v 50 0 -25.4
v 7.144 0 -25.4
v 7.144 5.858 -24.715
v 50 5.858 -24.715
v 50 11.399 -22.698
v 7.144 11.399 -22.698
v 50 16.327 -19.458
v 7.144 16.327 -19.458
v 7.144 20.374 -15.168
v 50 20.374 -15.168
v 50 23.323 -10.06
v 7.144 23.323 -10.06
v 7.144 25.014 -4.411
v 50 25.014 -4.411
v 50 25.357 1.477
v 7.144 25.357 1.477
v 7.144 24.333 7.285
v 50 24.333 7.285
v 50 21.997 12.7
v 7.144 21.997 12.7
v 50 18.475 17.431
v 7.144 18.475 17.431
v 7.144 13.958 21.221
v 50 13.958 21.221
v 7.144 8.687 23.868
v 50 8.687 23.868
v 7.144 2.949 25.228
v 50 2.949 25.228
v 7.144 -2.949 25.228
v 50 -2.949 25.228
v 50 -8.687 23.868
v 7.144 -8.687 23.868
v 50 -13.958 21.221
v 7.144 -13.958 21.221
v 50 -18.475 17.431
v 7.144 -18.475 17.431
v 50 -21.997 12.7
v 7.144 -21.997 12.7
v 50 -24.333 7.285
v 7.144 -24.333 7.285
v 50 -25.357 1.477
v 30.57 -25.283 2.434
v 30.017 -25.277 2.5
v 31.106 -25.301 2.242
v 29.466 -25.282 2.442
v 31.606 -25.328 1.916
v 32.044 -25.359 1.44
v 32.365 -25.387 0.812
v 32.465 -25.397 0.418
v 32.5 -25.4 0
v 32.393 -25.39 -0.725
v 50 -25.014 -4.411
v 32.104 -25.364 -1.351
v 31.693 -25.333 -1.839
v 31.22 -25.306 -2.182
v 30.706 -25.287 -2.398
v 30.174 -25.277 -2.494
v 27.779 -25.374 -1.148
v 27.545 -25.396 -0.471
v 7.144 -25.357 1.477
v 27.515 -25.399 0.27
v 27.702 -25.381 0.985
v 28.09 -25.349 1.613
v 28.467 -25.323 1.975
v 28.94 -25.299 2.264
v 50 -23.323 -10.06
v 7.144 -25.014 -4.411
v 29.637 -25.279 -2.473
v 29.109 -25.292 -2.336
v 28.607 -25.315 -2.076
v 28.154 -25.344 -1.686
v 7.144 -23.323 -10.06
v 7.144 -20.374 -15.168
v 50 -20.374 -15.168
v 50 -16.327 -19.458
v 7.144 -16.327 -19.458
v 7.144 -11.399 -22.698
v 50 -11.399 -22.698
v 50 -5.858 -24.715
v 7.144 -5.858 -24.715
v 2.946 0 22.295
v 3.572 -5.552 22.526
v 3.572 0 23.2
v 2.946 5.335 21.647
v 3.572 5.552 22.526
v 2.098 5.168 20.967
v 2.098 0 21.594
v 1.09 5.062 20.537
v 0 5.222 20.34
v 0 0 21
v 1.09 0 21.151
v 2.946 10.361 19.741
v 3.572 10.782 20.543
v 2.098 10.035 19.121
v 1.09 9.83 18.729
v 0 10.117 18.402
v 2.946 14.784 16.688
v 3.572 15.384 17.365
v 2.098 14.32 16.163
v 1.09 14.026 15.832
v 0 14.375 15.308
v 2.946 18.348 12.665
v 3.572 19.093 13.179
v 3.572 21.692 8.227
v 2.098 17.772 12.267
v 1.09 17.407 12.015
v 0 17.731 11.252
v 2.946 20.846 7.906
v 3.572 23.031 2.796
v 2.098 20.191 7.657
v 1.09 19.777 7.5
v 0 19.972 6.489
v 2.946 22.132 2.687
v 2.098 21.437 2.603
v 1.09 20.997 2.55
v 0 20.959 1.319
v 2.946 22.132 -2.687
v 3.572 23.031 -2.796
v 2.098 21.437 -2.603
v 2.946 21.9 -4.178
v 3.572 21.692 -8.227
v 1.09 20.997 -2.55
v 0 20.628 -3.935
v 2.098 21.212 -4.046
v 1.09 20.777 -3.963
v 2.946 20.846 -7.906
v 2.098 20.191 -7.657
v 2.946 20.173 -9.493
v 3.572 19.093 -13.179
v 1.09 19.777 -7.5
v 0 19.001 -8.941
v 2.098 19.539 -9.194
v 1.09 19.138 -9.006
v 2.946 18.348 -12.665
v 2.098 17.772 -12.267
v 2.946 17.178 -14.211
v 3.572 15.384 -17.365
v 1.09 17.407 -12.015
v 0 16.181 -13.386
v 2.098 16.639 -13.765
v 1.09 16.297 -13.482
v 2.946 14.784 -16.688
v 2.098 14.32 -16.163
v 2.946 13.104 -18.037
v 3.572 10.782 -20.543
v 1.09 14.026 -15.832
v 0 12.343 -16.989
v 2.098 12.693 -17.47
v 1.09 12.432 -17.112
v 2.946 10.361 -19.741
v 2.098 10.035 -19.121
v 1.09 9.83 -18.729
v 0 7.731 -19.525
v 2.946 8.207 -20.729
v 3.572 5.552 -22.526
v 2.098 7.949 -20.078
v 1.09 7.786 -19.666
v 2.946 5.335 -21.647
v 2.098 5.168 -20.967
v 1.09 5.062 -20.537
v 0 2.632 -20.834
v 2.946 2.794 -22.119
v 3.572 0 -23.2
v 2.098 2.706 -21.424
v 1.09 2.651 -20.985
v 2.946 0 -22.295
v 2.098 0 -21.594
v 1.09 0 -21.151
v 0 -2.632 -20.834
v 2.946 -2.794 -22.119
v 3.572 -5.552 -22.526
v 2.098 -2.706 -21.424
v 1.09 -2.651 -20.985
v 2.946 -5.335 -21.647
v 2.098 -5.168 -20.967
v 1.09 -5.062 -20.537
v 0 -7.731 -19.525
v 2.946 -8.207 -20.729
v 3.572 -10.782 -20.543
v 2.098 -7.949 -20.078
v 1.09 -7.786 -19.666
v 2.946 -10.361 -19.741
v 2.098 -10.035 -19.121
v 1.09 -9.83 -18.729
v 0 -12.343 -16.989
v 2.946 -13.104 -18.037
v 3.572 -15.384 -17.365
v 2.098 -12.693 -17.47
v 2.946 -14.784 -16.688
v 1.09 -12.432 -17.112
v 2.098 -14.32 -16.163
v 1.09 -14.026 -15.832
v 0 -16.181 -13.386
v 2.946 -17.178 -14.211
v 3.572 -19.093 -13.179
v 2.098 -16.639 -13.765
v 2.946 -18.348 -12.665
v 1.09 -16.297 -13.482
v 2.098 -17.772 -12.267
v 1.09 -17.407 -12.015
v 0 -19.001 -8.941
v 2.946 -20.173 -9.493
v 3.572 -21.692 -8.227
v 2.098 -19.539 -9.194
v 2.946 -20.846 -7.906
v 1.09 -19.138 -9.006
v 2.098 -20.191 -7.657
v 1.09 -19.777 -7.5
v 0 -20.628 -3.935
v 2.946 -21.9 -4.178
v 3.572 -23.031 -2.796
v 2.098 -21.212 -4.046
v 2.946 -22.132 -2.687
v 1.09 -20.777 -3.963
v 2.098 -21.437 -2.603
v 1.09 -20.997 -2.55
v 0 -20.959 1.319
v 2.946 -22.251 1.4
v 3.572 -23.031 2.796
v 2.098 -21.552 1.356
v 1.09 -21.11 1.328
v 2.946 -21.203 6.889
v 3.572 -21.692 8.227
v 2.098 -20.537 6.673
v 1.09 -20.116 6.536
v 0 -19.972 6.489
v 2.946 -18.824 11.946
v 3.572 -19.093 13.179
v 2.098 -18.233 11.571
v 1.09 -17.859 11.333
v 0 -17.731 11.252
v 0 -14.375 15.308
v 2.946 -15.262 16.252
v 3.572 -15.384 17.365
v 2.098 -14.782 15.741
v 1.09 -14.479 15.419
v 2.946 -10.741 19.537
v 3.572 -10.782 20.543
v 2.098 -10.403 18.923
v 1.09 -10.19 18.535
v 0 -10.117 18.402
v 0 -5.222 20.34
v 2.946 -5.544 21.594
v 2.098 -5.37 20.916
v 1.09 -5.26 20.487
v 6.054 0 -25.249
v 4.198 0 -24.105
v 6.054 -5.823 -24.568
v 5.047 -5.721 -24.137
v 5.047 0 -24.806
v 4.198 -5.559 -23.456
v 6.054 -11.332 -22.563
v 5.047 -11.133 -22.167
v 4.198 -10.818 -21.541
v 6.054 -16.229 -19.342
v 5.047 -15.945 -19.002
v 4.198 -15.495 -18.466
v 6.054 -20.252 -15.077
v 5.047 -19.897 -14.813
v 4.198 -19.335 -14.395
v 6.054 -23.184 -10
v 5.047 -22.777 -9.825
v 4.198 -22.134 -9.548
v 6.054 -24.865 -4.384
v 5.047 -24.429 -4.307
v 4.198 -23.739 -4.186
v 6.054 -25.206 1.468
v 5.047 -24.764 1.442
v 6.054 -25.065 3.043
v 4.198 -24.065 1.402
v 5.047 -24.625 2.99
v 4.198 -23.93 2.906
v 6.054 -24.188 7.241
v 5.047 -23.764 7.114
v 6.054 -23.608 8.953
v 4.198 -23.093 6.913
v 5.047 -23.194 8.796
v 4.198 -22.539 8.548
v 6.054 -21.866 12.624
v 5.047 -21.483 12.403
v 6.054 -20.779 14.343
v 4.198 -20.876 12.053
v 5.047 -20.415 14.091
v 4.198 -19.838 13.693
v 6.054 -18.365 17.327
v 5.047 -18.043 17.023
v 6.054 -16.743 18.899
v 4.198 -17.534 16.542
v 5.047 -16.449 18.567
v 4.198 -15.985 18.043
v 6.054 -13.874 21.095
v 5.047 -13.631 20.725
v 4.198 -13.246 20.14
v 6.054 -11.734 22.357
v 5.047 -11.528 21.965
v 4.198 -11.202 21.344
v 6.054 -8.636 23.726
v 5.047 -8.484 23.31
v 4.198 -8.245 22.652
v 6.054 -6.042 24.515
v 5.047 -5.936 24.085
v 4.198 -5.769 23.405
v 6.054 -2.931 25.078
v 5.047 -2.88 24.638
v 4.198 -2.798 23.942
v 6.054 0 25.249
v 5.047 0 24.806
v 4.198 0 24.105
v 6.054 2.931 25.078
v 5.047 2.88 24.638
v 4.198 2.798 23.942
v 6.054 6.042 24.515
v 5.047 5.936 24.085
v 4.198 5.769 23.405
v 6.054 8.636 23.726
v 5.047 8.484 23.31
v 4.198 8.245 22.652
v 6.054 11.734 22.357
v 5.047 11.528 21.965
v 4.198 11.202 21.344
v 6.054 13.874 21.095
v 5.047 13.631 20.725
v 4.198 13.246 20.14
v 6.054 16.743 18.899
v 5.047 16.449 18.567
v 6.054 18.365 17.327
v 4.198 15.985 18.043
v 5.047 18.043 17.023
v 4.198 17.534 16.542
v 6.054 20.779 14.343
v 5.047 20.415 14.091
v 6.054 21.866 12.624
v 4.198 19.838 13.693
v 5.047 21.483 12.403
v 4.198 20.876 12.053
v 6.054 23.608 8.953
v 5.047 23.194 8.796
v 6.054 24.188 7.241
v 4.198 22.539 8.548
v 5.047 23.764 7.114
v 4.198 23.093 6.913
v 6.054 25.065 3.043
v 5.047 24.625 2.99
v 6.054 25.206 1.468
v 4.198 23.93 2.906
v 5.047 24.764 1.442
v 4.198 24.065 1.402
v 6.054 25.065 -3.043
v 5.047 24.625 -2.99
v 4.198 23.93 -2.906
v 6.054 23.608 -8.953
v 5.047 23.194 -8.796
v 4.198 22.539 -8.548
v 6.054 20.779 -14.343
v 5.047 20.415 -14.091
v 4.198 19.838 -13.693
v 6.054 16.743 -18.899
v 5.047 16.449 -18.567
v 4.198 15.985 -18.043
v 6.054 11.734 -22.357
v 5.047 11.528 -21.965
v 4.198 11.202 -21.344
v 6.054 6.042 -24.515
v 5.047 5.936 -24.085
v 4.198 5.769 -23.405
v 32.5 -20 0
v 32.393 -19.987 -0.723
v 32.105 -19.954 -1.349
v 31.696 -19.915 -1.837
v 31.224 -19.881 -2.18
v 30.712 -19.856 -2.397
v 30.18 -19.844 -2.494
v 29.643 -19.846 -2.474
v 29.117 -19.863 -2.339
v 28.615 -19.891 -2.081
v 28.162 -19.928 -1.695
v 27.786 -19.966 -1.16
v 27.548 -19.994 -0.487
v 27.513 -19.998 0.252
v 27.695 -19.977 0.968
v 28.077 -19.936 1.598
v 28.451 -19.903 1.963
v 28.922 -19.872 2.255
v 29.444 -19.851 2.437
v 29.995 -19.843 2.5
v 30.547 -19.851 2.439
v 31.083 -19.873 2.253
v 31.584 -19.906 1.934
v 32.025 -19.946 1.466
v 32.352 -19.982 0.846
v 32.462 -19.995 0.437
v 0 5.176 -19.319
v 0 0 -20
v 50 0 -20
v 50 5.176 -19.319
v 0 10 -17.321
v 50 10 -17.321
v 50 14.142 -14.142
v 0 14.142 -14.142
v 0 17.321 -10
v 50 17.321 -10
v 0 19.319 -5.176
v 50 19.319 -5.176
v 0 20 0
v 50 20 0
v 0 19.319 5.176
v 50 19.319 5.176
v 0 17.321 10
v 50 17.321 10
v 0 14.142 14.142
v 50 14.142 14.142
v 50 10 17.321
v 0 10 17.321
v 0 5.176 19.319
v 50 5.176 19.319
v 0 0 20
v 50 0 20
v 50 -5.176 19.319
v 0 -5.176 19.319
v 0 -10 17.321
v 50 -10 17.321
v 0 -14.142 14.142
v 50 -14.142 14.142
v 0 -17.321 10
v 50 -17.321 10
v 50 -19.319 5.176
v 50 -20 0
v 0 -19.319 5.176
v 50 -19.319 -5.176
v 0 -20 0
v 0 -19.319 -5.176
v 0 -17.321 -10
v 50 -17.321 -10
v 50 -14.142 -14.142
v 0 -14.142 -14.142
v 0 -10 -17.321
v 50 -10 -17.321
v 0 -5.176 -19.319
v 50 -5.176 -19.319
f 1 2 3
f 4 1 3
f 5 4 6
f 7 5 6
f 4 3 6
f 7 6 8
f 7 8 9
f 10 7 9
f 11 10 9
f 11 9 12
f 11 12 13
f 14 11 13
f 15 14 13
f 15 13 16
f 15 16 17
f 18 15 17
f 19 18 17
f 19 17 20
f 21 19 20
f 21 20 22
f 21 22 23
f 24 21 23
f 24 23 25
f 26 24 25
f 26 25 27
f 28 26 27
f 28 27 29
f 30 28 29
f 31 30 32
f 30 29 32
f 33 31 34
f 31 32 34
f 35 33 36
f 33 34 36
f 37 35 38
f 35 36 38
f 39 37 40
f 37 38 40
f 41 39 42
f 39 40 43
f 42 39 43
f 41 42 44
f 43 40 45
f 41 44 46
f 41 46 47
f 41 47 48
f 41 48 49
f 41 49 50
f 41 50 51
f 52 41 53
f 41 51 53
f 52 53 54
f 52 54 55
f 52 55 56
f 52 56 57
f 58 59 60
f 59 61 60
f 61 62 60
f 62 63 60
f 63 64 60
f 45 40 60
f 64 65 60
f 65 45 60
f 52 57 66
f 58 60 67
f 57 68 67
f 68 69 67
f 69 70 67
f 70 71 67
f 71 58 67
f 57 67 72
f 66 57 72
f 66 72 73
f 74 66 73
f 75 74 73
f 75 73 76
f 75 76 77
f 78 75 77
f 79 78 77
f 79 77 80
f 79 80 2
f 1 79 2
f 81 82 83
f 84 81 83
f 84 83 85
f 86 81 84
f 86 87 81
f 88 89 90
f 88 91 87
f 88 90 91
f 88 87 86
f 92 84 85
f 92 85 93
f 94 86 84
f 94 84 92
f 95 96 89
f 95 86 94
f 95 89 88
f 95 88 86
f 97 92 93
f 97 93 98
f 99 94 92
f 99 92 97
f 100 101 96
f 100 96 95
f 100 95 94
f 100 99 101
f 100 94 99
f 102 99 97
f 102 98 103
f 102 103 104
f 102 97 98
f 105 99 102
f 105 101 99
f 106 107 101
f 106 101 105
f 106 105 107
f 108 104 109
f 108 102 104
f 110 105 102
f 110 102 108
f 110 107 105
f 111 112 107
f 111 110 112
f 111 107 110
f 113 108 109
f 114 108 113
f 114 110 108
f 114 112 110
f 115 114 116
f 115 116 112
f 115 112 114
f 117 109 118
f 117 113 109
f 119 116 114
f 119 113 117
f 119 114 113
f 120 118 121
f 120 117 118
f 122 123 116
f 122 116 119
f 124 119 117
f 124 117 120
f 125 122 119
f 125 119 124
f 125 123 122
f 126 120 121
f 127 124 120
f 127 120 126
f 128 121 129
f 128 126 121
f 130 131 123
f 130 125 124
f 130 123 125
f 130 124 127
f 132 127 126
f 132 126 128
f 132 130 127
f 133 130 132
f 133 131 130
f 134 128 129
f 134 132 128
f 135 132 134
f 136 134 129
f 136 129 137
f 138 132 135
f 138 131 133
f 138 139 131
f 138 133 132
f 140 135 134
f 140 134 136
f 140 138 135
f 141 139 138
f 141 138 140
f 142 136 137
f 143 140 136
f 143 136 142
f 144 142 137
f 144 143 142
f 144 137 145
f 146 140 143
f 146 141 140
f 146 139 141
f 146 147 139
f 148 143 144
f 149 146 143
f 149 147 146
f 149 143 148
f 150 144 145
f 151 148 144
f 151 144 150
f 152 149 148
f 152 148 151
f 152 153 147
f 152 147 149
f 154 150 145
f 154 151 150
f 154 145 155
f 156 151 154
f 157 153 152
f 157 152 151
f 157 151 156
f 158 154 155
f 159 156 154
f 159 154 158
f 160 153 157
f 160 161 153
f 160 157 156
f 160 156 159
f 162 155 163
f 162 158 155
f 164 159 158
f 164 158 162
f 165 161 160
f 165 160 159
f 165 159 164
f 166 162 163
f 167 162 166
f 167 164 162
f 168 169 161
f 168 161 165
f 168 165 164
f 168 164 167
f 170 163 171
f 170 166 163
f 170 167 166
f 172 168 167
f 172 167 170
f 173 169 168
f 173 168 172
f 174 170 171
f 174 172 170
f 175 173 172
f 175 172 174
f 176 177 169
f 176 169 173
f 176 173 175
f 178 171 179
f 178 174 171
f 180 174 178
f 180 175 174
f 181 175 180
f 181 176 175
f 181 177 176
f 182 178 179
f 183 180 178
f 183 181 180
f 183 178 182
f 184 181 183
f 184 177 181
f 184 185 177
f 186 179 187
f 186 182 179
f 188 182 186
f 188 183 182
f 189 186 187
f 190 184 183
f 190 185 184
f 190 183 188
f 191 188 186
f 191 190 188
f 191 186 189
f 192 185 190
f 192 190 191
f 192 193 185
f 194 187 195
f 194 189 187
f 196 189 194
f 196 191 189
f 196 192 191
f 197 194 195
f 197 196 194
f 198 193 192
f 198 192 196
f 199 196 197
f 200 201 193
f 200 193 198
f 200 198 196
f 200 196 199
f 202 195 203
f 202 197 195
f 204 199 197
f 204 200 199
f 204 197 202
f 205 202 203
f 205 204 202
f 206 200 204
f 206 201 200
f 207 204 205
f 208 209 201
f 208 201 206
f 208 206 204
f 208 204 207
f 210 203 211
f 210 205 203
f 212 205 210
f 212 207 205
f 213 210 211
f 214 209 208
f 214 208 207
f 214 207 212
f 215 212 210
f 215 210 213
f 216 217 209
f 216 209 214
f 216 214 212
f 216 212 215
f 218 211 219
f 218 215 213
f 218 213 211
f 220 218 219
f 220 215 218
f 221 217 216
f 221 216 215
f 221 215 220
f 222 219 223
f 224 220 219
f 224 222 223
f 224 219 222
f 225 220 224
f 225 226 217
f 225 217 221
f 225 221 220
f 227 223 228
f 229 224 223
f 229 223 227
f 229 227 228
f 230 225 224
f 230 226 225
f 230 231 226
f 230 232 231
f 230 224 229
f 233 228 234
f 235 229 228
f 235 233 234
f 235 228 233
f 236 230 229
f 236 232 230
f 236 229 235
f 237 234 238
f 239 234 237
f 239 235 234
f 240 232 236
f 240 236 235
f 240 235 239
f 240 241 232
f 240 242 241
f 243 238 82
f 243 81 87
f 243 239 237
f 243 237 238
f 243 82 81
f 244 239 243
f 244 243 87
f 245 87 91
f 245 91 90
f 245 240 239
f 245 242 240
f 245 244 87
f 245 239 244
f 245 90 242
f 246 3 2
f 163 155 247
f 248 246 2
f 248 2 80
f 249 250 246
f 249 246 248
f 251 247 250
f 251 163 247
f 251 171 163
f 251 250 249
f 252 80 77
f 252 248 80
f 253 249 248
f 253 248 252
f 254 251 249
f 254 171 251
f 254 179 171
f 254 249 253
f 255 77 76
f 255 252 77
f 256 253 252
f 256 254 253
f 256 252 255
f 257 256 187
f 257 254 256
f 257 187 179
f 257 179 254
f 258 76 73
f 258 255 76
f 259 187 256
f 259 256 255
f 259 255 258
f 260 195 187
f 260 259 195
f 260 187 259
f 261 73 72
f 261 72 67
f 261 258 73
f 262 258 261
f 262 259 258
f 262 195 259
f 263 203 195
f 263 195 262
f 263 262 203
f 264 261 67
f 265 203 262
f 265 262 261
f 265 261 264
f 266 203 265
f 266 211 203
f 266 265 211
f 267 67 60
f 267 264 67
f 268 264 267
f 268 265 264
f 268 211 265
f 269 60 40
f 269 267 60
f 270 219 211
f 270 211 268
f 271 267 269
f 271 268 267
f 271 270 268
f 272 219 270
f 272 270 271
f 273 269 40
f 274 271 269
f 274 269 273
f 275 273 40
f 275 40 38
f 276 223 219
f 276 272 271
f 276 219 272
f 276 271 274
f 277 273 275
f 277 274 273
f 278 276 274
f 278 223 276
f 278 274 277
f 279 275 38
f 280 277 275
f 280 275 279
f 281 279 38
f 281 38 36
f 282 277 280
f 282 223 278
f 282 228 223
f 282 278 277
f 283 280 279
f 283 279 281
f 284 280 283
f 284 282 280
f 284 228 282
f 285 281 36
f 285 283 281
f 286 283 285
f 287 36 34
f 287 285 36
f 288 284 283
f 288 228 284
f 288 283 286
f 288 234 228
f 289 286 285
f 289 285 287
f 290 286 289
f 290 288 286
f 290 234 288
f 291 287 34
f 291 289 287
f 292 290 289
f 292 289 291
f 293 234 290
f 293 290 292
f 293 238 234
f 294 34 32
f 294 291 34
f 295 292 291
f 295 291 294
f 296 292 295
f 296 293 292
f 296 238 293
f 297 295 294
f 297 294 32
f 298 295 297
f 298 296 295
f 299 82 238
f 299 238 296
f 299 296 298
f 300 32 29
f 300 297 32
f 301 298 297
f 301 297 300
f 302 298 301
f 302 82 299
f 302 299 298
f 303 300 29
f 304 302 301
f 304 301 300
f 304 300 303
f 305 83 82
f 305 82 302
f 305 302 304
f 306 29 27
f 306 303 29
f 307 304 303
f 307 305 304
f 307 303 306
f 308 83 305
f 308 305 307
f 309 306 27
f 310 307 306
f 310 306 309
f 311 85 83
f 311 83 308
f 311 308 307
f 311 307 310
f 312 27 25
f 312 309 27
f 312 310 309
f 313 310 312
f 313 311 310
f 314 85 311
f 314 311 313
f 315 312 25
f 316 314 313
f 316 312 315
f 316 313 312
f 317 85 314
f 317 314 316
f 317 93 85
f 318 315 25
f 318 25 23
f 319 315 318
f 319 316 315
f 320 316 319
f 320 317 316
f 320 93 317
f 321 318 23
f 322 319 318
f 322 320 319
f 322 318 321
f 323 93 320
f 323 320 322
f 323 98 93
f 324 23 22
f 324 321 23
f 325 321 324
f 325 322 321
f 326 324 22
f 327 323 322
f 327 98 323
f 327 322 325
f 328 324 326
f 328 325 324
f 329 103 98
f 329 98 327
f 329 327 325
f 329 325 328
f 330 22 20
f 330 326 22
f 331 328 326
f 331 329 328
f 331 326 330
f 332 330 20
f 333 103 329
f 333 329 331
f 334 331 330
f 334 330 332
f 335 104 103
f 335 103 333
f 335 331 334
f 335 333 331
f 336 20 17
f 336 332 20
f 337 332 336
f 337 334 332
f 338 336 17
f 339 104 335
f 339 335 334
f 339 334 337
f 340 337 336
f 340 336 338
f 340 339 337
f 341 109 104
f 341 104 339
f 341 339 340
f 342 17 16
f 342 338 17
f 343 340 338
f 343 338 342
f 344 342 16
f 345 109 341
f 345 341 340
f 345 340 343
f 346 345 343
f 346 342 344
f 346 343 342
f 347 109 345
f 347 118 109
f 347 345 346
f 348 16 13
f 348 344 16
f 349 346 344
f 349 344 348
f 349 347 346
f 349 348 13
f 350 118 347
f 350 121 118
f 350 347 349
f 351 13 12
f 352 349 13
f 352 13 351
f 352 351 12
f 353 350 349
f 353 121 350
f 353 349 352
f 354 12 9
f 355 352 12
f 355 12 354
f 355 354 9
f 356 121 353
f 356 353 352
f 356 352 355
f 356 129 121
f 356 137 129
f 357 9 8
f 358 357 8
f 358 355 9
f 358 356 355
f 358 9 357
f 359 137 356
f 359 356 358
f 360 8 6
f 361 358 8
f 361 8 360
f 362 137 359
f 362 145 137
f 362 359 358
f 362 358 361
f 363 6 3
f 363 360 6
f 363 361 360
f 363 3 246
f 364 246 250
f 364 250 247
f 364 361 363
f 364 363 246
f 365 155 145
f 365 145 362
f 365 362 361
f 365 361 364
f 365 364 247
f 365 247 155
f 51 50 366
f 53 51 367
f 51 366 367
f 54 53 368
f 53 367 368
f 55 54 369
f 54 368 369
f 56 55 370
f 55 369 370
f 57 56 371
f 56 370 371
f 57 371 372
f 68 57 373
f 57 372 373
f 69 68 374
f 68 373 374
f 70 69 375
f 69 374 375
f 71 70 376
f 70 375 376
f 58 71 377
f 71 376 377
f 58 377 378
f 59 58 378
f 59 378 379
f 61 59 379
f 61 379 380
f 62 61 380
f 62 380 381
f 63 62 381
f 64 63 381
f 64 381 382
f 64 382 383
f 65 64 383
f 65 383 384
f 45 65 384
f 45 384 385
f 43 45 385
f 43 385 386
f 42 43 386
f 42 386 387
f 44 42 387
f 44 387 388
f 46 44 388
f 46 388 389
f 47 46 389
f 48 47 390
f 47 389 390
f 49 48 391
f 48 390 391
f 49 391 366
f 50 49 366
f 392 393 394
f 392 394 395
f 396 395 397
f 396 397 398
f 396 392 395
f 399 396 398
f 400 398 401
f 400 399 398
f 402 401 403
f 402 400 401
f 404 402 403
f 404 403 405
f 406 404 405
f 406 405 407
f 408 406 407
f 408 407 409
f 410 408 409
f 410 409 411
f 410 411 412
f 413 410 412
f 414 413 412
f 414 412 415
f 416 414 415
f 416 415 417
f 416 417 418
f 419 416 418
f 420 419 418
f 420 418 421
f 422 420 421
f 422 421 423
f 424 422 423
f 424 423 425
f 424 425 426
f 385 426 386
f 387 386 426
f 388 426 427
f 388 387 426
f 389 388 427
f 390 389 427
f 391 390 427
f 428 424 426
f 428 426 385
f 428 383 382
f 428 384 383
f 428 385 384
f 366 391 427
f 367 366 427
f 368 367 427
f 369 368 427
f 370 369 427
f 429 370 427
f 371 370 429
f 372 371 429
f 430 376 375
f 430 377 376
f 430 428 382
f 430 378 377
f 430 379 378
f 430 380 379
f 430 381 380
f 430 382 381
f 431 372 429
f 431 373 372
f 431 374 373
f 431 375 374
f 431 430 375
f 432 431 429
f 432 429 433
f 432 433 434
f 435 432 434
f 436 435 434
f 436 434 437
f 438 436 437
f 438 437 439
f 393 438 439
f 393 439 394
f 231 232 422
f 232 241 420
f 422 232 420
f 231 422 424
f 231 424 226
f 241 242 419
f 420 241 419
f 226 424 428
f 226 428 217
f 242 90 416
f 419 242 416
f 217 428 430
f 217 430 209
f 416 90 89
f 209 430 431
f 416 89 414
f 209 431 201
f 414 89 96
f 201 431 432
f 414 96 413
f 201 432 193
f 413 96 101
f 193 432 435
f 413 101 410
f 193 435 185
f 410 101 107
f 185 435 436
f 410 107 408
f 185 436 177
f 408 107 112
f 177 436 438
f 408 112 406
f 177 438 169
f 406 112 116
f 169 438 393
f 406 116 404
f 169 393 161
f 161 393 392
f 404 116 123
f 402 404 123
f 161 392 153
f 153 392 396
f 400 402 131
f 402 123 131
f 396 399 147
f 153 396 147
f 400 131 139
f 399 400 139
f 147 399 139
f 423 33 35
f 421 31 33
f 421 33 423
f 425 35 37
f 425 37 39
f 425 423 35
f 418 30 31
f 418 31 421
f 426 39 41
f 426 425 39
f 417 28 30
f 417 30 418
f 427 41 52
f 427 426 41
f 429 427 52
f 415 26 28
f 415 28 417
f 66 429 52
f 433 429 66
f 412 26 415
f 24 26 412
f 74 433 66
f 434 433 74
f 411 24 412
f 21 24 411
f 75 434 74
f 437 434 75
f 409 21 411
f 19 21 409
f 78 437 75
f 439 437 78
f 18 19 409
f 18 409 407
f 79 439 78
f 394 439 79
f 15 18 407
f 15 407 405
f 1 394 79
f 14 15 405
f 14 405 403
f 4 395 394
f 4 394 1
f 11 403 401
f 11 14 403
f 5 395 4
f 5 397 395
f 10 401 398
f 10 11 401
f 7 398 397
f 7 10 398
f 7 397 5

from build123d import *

# Parameters (mm, degrees)
SKETCH1_R                 = 25.4
SKETCH1_R_2               = 20
BOSS_EXTRUDE1_DEPTH       = 50
SKETCH2_R                 = 30
SKETCH2_R_2               = 21
CUT_EXTRUDE1_DEPTH        = 4
FILLET1_R                 = 4
FILLET2_R                 = 4
M6X1_0_TAPPED_HOLE1_D     = 5
M6X1_0_TAPPED_HOLE1_DEPTH = 13.497848452
M6X1_0_TAPPED_HOLE1_TIP   = 1.502151548


# Some blends are built 0.0001 mm under size
with BuildPart() as part:
    # Sketch1 → Boss-Extrude1 (new body)
    with BuildSketch(Plane(origin=(0, 0, 0), x_dir=(0, 0, -1), z_dir=(1, 0, 0))):
        Circle(SKETCH1_R)
        Circle(SKETCH1_R_2, mode=Mode.SUBTRACT)
    extrude(amount=BOSS_EXTRUDE1_DEPTH)

    # Sketch2 → Cut-Extrude1 (cut)
    with BuildSketch(Plane.ZY):
        Circle(SKETCH2_R)
        Circle(SKETCH2_R_2, mode=Mode.SUBTRACT)
    extrude(amount=-CUT_EXTRUDE1_DEPTH, mode=Mode.SUBTRACT)

    # Fillet1
    fillet1_edges = [part.edges().sort_by_distance(p)[0] for p in [
        (4, 0, -21),
    ]]
    fillet(fillet1_edges, radius=FILLET1_R - 0.0001)  # a hair under: the kernel refuses the full size

    # Fillet2
    # the kernel refuses this fillet: 4 mm, written as the material it takes off along each edge
    with BuildSketch(Plane(origin=(4, 0, 0), x_dir=(0, 0, -1), z_dir=(0, 1, 0))) as fillet2_piece_1:
        with BuildLine():
            CenterArc((21.4, -3.144266851), FILLET2_R, 0, 63.256757147)
            Line((25.4, -3.144266851), (25.8, -3.144266851))
            Line((25.8, -3.144266851), (25.8, 0))
            Line((25.8, 0), (25.4, 0.4))
            ThreePointArc((25.4, 0.4), (24.9999, 0.4), (23.37996975, 0.785074034))
            Line((23.37996975, 0.785074034), (23.1999725, 0.427861226))
        make_face()
    revolve(axis=Axis((4, 0, 0), (-1, 0, 0)), mode=Mode.SUBTRACT)

    # M6x1.0 Tapped Hole1
    with Locations(Plane(origin=(0, -25.4, 0), x_dir=(-1, 0, 0), z_dir=(0, -1, 0))):
        with Locations((-30, 0)):
            Hole(M6X1_0_TAPPED_HOLE1_D / 2, depth=M6X1_0_TAPPED_HOLE1_DEPTH)
            with Locations((0, 0, -(M6X1_0_TAPPED_HOLE1_DEPTH + M6X1_0_TAPPED_HOLE1_TIP / 2))):  # 118° drill point
                Cone(0, M6X1_0_TAPPED_HOLE1_D / 2, M6X1_0_TAPPED_HOLE1_TIP, mode=Mode.SUBTRACT)


solid = part.part
